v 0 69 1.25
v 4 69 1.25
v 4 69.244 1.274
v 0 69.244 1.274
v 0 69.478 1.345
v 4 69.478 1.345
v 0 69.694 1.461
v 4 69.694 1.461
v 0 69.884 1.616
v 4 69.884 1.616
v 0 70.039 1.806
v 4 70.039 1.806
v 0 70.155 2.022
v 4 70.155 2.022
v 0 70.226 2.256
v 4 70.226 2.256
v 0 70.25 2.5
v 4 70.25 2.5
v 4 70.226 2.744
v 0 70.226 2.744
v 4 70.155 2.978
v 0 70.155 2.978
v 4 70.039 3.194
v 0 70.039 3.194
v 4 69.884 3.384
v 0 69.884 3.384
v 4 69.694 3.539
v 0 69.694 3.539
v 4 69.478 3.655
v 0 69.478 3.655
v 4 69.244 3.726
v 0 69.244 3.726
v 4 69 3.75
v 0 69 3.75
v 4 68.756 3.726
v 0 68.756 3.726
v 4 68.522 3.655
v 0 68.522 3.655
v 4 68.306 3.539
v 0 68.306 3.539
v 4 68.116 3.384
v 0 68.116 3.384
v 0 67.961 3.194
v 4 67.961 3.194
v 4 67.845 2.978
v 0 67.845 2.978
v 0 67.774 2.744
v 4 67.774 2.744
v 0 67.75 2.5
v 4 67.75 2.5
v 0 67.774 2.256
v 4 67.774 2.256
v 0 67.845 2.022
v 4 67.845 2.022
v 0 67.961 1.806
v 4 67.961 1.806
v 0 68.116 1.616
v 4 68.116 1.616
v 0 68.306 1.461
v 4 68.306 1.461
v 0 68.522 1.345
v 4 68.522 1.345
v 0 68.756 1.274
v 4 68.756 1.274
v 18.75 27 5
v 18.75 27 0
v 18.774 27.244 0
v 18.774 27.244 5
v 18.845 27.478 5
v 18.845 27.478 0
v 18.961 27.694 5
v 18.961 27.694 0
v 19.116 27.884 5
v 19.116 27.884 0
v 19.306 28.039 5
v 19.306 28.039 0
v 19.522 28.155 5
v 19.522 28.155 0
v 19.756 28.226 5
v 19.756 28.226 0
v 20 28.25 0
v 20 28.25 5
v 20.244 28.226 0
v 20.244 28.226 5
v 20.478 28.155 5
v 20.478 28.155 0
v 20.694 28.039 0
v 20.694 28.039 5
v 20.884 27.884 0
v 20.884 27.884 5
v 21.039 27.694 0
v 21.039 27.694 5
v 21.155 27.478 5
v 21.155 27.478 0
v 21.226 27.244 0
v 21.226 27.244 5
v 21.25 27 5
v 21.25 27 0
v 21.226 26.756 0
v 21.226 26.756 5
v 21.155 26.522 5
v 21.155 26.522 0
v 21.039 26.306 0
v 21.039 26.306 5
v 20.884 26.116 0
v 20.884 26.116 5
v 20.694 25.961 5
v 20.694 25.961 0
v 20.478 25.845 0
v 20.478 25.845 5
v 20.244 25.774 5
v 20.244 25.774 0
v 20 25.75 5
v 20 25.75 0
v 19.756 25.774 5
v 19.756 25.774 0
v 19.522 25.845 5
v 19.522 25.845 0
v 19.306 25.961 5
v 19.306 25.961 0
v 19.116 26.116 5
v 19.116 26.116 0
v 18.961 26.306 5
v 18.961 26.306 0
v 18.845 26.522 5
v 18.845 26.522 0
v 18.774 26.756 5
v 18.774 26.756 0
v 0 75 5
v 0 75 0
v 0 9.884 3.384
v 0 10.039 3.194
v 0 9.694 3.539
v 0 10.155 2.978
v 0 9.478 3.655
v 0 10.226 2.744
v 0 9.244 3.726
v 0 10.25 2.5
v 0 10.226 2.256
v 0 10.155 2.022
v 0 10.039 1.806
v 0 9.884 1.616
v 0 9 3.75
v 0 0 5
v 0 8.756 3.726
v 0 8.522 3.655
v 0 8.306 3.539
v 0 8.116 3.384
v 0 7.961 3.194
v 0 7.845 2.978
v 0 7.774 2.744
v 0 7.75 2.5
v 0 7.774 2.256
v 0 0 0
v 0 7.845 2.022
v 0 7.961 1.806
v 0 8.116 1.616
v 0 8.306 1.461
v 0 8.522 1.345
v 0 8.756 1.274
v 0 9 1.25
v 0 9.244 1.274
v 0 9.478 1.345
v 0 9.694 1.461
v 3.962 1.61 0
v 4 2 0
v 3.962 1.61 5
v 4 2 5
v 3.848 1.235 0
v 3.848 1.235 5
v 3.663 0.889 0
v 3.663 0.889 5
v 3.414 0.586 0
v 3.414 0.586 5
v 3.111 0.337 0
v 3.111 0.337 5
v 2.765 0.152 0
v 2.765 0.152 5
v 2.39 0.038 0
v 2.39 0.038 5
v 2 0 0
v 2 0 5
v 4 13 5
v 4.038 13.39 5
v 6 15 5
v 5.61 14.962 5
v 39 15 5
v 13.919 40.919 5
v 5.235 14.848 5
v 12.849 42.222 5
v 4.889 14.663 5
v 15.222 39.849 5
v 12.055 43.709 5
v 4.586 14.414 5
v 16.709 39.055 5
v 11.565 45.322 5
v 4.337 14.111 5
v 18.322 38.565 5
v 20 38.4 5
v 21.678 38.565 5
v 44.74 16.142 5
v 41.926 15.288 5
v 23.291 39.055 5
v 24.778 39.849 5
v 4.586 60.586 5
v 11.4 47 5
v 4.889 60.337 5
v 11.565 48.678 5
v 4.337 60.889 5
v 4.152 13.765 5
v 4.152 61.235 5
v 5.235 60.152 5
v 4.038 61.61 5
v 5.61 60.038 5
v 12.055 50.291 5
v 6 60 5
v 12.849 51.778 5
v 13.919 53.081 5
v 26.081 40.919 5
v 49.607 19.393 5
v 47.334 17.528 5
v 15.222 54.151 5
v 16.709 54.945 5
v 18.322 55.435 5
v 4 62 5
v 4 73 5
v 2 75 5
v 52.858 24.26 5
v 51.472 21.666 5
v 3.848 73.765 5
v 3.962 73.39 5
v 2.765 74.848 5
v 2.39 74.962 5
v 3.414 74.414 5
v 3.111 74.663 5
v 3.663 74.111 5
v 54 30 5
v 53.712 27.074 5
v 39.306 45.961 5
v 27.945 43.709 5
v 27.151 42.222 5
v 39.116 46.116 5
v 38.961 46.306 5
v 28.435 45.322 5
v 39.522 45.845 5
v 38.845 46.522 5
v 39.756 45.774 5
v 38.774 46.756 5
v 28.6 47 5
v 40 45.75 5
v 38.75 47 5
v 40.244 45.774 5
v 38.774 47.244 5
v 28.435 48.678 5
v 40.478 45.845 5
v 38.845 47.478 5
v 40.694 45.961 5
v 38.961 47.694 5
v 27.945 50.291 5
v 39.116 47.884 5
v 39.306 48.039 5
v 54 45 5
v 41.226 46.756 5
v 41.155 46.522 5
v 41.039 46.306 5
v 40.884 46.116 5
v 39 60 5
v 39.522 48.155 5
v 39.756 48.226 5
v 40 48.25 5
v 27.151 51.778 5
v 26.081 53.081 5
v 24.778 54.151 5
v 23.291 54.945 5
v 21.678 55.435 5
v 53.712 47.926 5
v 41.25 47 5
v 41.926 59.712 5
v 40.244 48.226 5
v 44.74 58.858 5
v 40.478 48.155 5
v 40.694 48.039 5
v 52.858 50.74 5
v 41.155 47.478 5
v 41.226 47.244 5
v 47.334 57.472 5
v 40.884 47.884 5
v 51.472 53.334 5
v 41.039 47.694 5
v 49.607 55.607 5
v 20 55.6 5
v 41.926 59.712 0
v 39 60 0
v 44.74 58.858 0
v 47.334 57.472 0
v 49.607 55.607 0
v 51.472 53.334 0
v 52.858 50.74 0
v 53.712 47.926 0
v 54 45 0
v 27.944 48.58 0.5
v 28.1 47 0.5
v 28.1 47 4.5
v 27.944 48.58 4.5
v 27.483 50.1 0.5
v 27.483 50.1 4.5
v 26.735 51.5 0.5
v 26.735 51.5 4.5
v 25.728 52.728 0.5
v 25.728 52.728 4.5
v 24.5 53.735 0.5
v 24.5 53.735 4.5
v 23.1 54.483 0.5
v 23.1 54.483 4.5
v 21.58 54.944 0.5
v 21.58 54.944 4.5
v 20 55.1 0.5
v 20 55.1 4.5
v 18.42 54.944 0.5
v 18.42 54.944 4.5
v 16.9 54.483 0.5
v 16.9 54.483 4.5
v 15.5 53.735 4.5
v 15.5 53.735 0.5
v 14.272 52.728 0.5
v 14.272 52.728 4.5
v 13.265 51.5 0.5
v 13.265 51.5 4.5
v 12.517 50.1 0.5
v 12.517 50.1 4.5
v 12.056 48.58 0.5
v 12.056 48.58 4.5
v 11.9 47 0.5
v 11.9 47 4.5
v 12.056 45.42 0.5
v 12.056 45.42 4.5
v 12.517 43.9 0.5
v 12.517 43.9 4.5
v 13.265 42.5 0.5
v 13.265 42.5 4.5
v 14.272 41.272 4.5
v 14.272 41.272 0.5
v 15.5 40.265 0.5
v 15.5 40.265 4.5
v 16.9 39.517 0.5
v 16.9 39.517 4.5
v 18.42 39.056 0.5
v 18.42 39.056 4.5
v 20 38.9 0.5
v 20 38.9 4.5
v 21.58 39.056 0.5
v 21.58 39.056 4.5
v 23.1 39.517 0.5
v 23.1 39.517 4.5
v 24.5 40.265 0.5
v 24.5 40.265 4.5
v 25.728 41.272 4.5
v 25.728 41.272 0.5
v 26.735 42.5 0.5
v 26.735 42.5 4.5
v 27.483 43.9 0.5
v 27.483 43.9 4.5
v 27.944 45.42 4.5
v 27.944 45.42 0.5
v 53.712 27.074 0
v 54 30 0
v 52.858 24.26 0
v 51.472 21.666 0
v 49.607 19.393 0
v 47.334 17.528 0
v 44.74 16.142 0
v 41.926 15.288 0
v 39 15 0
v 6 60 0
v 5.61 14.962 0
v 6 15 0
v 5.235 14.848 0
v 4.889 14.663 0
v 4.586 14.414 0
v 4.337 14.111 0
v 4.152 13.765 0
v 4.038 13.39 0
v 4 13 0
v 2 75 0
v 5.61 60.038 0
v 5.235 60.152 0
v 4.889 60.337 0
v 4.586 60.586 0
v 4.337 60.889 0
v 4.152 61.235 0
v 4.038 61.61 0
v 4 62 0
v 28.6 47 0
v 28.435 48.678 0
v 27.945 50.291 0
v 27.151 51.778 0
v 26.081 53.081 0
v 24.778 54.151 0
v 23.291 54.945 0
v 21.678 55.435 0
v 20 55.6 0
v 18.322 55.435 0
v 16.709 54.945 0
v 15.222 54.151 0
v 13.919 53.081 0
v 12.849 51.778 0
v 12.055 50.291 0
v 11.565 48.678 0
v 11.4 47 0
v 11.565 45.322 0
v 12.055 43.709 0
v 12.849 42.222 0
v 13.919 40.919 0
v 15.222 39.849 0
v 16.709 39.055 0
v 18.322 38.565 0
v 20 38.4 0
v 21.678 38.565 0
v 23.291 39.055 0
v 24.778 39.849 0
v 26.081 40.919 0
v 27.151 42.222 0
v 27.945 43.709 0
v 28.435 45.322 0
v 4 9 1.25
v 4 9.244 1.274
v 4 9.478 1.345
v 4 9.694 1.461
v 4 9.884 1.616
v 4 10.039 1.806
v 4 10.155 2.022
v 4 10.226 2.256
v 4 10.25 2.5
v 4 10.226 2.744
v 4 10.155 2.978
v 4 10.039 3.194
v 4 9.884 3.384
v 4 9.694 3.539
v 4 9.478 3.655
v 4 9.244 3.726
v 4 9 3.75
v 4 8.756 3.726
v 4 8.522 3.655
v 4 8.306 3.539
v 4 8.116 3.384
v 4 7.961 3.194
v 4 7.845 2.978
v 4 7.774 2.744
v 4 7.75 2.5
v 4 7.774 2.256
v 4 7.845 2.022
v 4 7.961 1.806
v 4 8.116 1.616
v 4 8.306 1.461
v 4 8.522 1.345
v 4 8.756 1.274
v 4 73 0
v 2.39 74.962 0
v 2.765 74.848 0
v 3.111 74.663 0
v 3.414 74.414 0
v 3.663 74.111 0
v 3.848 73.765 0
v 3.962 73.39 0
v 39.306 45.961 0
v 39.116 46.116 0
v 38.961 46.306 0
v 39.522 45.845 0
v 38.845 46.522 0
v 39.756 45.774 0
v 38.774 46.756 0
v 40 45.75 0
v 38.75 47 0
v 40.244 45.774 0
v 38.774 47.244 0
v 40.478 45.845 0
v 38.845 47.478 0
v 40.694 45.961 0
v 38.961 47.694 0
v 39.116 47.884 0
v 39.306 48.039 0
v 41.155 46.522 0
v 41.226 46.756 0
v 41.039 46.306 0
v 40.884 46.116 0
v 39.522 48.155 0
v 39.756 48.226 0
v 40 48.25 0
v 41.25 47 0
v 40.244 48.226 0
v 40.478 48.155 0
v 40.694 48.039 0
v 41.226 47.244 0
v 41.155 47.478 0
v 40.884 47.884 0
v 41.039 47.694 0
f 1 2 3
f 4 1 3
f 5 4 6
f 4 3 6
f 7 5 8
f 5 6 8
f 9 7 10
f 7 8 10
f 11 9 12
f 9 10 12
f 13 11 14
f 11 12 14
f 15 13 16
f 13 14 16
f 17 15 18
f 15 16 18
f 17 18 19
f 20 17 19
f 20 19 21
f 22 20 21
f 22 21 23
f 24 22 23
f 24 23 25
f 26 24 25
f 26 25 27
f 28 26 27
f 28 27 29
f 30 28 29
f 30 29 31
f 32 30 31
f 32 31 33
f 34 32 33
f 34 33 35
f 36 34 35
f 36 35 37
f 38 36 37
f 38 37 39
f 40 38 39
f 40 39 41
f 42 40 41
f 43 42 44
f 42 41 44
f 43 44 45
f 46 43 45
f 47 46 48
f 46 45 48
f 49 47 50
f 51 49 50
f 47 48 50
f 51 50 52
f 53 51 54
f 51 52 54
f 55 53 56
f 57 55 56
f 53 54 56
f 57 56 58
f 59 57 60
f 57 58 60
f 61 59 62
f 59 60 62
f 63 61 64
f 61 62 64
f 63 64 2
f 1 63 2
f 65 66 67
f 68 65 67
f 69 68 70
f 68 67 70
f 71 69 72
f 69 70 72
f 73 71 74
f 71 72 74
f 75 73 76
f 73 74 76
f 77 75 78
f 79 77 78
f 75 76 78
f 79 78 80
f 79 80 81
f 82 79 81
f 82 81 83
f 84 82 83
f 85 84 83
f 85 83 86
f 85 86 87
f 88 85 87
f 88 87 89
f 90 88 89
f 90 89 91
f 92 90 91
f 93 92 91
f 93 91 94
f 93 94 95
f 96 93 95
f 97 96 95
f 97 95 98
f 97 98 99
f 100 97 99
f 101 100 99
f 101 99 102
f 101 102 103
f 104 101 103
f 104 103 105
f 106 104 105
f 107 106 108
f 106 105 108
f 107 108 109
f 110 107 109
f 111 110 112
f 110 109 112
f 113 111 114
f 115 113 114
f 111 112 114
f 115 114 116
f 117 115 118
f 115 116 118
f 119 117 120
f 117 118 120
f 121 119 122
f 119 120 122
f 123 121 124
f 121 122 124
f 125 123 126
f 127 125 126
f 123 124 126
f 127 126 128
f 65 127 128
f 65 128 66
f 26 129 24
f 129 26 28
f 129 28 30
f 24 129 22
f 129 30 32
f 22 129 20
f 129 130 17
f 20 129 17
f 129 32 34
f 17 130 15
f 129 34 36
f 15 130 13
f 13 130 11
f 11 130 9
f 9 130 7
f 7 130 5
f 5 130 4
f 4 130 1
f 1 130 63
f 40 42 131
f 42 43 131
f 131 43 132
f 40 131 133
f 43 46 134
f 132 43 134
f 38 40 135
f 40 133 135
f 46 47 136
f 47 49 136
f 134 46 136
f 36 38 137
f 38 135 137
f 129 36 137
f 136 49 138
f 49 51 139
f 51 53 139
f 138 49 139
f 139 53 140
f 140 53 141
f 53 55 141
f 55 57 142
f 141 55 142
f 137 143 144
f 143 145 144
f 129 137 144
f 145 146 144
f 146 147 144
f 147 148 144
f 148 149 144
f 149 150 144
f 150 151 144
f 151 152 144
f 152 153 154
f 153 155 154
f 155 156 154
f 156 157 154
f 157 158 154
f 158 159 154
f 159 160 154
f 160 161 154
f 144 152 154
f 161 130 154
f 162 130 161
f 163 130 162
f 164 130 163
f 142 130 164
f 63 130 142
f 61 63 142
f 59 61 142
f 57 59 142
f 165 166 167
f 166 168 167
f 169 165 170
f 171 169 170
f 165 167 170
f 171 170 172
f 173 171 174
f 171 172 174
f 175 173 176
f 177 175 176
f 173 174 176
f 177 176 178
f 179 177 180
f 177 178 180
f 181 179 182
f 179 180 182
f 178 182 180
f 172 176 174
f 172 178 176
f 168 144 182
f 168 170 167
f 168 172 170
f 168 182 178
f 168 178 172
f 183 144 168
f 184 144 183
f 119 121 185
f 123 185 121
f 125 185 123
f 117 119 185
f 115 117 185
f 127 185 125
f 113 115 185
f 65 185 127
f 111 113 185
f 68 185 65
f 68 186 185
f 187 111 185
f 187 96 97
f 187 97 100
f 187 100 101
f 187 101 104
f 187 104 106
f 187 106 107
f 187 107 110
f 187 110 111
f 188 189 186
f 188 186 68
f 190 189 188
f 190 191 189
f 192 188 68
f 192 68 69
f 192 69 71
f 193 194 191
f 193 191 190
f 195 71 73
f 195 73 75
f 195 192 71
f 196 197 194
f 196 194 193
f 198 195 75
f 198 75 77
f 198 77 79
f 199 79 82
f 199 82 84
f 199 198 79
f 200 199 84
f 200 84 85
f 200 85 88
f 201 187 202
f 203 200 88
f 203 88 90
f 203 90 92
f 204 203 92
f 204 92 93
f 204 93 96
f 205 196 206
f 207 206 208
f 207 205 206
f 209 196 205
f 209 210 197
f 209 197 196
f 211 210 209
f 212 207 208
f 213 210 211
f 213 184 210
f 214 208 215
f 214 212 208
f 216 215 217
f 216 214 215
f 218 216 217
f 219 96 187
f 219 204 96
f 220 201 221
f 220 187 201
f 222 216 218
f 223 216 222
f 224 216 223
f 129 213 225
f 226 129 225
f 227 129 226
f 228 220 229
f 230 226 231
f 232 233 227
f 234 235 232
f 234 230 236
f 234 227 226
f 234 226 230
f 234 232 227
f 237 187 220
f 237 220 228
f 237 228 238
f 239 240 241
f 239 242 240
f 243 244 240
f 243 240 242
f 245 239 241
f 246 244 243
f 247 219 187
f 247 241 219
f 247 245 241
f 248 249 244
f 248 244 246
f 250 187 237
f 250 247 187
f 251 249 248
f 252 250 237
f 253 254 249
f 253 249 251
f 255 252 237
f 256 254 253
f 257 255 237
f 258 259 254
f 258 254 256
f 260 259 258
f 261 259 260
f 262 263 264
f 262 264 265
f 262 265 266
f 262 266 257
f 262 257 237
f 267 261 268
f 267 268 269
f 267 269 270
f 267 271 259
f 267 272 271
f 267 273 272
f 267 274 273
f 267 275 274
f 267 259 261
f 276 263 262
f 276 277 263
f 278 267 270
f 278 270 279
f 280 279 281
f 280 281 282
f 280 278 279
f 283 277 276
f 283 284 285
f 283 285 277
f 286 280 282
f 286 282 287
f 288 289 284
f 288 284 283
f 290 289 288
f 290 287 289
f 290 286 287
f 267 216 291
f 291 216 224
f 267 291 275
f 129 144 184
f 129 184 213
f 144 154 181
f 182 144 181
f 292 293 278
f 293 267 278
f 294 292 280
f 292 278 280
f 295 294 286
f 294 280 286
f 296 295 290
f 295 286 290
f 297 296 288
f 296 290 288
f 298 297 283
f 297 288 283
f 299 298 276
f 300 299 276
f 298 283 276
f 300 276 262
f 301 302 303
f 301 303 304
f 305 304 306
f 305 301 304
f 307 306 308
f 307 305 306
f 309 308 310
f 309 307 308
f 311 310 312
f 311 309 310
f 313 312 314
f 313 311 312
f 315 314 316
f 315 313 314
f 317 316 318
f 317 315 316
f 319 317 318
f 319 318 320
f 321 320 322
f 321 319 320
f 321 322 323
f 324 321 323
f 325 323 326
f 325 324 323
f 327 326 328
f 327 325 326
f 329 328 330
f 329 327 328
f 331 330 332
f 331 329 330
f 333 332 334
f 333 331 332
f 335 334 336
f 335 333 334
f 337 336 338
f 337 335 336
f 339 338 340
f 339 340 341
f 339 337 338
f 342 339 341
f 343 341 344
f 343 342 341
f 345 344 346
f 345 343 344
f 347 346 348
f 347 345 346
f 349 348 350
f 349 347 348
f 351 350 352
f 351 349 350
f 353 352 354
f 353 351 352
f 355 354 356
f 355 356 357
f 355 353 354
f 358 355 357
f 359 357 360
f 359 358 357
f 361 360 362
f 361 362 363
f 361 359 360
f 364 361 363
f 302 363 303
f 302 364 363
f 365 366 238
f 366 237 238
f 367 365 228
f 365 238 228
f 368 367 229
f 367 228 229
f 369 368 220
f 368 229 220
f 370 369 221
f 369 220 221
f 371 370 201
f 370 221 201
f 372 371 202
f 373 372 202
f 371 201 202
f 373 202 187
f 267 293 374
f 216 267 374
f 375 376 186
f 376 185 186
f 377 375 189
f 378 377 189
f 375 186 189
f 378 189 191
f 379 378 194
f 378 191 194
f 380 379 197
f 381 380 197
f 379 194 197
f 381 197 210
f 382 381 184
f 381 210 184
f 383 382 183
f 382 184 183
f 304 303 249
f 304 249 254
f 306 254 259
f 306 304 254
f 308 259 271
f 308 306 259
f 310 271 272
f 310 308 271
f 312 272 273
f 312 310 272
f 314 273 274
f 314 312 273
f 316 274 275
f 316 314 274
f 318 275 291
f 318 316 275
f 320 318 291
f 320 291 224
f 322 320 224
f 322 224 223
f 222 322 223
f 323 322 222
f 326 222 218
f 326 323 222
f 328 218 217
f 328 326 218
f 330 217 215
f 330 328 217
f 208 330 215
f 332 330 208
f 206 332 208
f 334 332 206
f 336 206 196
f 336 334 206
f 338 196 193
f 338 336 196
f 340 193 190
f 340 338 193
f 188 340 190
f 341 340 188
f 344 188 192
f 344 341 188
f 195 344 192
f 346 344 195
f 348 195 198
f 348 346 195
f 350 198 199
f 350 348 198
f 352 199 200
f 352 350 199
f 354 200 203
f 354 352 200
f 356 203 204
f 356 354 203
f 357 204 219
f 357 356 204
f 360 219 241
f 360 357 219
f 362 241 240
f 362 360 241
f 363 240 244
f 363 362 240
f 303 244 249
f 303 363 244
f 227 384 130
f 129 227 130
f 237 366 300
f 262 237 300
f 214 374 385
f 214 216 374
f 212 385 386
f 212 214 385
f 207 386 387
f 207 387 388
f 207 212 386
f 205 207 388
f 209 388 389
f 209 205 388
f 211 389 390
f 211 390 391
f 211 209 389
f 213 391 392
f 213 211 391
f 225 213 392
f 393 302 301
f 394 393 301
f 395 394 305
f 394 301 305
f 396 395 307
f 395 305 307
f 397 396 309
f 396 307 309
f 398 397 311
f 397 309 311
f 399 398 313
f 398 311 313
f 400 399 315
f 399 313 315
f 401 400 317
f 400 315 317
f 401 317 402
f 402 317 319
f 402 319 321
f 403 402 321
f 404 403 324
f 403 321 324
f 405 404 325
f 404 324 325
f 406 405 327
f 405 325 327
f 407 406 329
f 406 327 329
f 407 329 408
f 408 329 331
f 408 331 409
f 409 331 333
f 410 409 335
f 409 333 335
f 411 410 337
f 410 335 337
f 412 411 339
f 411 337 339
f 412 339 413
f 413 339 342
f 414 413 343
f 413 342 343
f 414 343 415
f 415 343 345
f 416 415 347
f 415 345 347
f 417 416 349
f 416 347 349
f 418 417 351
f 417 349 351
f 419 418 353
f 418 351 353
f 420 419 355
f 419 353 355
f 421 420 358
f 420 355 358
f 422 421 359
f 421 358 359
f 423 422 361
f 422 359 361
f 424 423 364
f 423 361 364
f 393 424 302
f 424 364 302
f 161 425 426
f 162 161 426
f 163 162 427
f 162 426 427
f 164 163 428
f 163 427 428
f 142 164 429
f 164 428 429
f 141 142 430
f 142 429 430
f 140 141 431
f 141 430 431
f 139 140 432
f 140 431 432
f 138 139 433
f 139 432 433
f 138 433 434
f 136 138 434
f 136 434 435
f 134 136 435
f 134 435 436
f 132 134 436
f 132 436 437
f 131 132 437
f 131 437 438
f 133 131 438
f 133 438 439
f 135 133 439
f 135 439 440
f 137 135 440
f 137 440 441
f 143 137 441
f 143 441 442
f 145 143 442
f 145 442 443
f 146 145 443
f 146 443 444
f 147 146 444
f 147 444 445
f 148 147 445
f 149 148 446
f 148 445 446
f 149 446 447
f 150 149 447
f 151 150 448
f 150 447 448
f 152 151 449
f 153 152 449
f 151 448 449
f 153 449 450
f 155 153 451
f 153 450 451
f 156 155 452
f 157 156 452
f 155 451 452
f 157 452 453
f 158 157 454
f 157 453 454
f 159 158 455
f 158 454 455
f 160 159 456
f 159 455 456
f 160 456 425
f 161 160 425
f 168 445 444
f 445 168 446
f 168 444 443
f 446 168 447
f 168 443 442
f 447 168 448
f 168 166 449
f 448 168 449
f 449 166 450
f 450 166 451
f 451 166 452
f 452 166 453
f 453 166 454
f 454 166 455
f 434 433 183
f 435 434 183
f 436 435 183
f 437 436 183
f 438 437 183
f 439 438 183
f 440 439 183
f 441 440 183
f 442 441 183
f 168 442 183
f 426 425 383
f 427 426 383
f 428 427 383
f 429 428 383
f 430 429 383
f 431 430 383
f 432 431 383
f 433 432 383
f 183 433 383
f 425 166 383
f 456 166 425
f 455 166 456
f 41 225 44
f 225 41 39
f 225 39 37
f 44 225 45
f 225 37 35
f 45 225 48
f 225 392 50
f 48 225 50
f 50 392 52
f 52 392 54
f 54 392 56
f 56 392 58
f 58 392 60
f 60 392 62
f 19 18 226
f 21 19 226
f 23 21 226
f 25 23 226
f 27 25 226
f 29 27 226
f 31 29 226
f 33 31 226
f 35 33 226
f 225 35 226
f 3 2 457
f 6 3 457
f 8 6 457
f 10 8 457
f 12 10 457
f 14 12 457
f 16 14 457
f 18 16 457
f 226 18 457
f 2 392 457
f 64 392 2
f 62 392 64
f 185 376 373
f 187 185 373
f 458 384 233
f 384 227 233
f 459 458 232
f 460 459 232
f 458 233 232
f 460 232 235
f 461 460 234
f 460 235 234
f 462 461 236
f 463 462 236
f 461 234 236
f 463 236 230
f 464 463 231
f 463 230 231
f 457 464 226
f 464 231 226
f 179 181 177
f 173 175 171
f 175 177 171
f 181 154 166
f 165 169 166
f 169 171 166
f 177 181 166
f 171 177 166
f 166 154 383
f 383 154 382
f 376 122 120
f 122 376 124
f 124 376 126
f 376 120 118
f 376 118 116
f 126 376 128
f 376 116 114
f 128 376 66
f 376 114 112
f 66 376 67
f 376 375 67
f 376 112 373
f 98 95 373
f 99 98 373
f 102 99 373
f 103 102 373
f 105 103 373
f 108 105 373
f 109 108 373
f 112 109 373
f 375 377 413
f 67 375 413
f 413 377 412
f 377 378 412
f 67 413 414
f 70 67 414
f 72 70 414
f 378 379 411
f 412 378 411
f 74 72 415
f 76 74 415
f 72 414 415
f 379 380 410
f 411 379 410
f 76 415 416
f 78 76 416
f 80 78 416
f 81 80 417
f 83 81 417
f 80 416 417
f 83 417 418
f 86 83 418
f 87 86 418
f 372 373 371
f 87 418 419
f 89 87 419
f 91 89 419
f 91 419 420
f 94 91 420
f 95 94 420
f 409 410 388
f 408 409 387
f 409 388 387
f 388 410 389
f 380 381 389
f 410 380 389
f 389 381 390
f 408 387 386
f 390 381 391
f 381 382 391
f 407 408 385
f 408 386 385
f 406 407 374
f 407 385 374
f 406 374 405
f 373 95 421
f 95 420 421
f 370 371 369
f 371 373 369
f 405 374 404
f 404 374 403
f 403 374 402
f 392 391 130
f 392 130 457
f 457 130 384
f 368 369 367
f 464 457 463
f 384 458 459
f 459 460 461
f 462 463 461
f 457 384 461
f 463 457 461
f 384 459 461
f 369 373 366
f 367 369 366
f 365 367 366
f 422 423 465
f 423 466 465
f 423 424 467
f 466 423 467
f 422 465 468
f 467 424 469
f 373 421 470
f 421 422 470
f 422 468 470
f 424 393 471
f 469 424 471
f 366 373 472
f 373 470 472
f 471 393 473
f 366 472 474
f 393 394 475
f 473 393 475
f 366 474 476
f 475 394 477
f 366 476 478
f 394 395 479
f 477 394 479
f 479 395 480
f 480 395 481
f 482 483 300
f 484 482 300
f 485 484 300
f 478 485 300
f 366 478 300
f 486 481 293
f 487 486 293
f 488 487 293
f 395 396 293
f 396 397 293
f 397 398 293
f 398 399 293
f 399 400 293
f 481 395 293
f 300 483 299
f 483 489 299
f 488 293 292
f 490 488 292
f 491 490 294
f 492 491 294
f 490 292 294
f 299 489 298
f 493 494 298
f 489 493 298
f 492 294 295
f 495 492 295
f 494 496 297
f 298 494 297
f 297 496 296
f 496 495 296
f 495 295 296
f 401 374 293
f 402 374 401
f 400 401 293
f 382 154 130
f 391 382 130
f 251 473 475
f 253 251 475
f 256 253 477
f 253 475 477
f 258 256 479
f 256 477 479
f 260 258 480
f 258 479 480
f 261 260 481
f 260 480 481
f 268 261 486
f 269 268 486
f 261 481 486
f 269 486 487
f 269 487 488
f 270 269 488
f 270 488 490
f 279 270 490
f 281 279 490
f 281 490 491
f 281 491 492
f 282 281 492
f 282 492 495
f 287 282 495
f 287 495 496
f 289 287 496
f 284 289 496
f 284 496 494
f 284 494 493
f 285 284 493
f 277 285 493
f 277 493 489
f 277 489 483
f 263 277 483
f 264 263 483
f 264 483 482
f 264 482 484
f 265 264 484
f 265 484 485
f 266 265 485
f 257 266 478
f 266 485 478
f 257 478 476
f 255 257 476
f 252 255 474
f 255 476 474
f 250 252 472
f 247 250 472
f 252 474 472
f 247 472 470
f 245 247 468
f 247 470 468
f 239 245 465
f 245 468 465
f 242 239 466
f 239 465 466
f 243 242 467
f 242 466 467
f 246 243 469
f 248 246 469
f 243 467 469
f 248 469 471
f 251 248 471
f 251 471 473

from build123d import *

# Parameters (mm, degrees)
SKETCH_1_R          = 8.1
EXTRUDE_1_DEPTH     = 5
SKETCH_2_R          = 1.25
CUT_EXTRUDE_1_DEPTH = 5
SKETCH_3_R          = 1.25
CUT_EXTRUDE_2_DEPTH = 120
CHAMFER_1_SIZE      = 0.5
SKETCH_4_W          = 16
SKETCH_4_H          = 45
CUT_EXTRUDE_3_DEPTH = 10
FILLET_1_R          = 2
FILLET_2_R          = 15


with BuildPart() as part:
    # 草图1 → 凸台-拉伸1 (new body)
    with BuildSketch(Plane.XY):
        Polygon((4, 60), (4, 75), (0, 75), (0, 0), (4, 0), (4, 15), (70, 15), (70, 60), align=None)
        with Locations((20, 47)):
            Circle(SKETCH_1_R, mode=Mode.SUBTRACT)
    extrude(amount=EXTRUDE_1_DEPTH)

    # 草图2 → 切除-拉伸1 (cut)
    with BuildSketch(Plane(origin=(4, 0, 0), x_dir=(0, 0, -1), z_dir=(1, 0, 0))):
        with Locations((-2.5, 69)):
            Circle(SKETCH_2_R)
        with Locations((-2.5, 9)):
            Circle(SKETCH_2_R)
    extrude(amount=-CUT_EXTRUDE_1_DEPTH, mode=Mode.SUBTRACT)

    # 草图3 → 切除-拉伸2 (cut)
    with BuildSketch(Plane(origin=(0, 0, 0), x_dir=(-1, 0, 0), z_dir=(0, 0, -1))):
        with Locations((-40, 47)):
            Circle(SKETCH_3_R)
        with Locations((-20, 27)):
            Circle(SKETCH_3_R)
    extrude(amount=-CUT_EXTRUDE_2_DEPTH, mode=Mode.SUBTRACT)

    # 倒角1
    chamfer_1_edges = [part.edges().sort_by_distance(p)[0] for p in [
        (11.9, 47, 0),
        (11.9, 47, 5),
    ]]
    chamfer(chamfer_1_edges, length=CHAMFER_1_SIZE)

    # 草图4 → 切除-拉伸3 (cut)
    with BuildSketch(Plane(origin=(0, 0, 0), x_dir=(-1, 0, 0), z_dir=(0, 0, -1))):
        with Locations((-62, 37.5)):
            Rectangle(SKETCH_4_W, SKETCH_4_H)
    extrude(amount=-CUT_EXTRUDE_3_DEPTH, mode=Mode.SUBTRACT)

    # 圆角1
    fillet_1_edges = [part.edges().sort_by_distance(p)[0] for p in [
        (4, 75, 2.5),
        (4, 60, 2.5),
        (4, 15, 2.5),
        (4, 0, 2.5),
    ]]
    fillet(fillet_1_edges, radius=FILLET_1_R)

    # 圆角2
    fillet_2_edges = [part.edges().sort_by_distance(p)[0] for p in [
        (54, 60, 2.5),
        (54, 15, 2.5),
    ]]
    fillet(fillet_2_edges, radius=FILLET_2_R)


solid = part.part
